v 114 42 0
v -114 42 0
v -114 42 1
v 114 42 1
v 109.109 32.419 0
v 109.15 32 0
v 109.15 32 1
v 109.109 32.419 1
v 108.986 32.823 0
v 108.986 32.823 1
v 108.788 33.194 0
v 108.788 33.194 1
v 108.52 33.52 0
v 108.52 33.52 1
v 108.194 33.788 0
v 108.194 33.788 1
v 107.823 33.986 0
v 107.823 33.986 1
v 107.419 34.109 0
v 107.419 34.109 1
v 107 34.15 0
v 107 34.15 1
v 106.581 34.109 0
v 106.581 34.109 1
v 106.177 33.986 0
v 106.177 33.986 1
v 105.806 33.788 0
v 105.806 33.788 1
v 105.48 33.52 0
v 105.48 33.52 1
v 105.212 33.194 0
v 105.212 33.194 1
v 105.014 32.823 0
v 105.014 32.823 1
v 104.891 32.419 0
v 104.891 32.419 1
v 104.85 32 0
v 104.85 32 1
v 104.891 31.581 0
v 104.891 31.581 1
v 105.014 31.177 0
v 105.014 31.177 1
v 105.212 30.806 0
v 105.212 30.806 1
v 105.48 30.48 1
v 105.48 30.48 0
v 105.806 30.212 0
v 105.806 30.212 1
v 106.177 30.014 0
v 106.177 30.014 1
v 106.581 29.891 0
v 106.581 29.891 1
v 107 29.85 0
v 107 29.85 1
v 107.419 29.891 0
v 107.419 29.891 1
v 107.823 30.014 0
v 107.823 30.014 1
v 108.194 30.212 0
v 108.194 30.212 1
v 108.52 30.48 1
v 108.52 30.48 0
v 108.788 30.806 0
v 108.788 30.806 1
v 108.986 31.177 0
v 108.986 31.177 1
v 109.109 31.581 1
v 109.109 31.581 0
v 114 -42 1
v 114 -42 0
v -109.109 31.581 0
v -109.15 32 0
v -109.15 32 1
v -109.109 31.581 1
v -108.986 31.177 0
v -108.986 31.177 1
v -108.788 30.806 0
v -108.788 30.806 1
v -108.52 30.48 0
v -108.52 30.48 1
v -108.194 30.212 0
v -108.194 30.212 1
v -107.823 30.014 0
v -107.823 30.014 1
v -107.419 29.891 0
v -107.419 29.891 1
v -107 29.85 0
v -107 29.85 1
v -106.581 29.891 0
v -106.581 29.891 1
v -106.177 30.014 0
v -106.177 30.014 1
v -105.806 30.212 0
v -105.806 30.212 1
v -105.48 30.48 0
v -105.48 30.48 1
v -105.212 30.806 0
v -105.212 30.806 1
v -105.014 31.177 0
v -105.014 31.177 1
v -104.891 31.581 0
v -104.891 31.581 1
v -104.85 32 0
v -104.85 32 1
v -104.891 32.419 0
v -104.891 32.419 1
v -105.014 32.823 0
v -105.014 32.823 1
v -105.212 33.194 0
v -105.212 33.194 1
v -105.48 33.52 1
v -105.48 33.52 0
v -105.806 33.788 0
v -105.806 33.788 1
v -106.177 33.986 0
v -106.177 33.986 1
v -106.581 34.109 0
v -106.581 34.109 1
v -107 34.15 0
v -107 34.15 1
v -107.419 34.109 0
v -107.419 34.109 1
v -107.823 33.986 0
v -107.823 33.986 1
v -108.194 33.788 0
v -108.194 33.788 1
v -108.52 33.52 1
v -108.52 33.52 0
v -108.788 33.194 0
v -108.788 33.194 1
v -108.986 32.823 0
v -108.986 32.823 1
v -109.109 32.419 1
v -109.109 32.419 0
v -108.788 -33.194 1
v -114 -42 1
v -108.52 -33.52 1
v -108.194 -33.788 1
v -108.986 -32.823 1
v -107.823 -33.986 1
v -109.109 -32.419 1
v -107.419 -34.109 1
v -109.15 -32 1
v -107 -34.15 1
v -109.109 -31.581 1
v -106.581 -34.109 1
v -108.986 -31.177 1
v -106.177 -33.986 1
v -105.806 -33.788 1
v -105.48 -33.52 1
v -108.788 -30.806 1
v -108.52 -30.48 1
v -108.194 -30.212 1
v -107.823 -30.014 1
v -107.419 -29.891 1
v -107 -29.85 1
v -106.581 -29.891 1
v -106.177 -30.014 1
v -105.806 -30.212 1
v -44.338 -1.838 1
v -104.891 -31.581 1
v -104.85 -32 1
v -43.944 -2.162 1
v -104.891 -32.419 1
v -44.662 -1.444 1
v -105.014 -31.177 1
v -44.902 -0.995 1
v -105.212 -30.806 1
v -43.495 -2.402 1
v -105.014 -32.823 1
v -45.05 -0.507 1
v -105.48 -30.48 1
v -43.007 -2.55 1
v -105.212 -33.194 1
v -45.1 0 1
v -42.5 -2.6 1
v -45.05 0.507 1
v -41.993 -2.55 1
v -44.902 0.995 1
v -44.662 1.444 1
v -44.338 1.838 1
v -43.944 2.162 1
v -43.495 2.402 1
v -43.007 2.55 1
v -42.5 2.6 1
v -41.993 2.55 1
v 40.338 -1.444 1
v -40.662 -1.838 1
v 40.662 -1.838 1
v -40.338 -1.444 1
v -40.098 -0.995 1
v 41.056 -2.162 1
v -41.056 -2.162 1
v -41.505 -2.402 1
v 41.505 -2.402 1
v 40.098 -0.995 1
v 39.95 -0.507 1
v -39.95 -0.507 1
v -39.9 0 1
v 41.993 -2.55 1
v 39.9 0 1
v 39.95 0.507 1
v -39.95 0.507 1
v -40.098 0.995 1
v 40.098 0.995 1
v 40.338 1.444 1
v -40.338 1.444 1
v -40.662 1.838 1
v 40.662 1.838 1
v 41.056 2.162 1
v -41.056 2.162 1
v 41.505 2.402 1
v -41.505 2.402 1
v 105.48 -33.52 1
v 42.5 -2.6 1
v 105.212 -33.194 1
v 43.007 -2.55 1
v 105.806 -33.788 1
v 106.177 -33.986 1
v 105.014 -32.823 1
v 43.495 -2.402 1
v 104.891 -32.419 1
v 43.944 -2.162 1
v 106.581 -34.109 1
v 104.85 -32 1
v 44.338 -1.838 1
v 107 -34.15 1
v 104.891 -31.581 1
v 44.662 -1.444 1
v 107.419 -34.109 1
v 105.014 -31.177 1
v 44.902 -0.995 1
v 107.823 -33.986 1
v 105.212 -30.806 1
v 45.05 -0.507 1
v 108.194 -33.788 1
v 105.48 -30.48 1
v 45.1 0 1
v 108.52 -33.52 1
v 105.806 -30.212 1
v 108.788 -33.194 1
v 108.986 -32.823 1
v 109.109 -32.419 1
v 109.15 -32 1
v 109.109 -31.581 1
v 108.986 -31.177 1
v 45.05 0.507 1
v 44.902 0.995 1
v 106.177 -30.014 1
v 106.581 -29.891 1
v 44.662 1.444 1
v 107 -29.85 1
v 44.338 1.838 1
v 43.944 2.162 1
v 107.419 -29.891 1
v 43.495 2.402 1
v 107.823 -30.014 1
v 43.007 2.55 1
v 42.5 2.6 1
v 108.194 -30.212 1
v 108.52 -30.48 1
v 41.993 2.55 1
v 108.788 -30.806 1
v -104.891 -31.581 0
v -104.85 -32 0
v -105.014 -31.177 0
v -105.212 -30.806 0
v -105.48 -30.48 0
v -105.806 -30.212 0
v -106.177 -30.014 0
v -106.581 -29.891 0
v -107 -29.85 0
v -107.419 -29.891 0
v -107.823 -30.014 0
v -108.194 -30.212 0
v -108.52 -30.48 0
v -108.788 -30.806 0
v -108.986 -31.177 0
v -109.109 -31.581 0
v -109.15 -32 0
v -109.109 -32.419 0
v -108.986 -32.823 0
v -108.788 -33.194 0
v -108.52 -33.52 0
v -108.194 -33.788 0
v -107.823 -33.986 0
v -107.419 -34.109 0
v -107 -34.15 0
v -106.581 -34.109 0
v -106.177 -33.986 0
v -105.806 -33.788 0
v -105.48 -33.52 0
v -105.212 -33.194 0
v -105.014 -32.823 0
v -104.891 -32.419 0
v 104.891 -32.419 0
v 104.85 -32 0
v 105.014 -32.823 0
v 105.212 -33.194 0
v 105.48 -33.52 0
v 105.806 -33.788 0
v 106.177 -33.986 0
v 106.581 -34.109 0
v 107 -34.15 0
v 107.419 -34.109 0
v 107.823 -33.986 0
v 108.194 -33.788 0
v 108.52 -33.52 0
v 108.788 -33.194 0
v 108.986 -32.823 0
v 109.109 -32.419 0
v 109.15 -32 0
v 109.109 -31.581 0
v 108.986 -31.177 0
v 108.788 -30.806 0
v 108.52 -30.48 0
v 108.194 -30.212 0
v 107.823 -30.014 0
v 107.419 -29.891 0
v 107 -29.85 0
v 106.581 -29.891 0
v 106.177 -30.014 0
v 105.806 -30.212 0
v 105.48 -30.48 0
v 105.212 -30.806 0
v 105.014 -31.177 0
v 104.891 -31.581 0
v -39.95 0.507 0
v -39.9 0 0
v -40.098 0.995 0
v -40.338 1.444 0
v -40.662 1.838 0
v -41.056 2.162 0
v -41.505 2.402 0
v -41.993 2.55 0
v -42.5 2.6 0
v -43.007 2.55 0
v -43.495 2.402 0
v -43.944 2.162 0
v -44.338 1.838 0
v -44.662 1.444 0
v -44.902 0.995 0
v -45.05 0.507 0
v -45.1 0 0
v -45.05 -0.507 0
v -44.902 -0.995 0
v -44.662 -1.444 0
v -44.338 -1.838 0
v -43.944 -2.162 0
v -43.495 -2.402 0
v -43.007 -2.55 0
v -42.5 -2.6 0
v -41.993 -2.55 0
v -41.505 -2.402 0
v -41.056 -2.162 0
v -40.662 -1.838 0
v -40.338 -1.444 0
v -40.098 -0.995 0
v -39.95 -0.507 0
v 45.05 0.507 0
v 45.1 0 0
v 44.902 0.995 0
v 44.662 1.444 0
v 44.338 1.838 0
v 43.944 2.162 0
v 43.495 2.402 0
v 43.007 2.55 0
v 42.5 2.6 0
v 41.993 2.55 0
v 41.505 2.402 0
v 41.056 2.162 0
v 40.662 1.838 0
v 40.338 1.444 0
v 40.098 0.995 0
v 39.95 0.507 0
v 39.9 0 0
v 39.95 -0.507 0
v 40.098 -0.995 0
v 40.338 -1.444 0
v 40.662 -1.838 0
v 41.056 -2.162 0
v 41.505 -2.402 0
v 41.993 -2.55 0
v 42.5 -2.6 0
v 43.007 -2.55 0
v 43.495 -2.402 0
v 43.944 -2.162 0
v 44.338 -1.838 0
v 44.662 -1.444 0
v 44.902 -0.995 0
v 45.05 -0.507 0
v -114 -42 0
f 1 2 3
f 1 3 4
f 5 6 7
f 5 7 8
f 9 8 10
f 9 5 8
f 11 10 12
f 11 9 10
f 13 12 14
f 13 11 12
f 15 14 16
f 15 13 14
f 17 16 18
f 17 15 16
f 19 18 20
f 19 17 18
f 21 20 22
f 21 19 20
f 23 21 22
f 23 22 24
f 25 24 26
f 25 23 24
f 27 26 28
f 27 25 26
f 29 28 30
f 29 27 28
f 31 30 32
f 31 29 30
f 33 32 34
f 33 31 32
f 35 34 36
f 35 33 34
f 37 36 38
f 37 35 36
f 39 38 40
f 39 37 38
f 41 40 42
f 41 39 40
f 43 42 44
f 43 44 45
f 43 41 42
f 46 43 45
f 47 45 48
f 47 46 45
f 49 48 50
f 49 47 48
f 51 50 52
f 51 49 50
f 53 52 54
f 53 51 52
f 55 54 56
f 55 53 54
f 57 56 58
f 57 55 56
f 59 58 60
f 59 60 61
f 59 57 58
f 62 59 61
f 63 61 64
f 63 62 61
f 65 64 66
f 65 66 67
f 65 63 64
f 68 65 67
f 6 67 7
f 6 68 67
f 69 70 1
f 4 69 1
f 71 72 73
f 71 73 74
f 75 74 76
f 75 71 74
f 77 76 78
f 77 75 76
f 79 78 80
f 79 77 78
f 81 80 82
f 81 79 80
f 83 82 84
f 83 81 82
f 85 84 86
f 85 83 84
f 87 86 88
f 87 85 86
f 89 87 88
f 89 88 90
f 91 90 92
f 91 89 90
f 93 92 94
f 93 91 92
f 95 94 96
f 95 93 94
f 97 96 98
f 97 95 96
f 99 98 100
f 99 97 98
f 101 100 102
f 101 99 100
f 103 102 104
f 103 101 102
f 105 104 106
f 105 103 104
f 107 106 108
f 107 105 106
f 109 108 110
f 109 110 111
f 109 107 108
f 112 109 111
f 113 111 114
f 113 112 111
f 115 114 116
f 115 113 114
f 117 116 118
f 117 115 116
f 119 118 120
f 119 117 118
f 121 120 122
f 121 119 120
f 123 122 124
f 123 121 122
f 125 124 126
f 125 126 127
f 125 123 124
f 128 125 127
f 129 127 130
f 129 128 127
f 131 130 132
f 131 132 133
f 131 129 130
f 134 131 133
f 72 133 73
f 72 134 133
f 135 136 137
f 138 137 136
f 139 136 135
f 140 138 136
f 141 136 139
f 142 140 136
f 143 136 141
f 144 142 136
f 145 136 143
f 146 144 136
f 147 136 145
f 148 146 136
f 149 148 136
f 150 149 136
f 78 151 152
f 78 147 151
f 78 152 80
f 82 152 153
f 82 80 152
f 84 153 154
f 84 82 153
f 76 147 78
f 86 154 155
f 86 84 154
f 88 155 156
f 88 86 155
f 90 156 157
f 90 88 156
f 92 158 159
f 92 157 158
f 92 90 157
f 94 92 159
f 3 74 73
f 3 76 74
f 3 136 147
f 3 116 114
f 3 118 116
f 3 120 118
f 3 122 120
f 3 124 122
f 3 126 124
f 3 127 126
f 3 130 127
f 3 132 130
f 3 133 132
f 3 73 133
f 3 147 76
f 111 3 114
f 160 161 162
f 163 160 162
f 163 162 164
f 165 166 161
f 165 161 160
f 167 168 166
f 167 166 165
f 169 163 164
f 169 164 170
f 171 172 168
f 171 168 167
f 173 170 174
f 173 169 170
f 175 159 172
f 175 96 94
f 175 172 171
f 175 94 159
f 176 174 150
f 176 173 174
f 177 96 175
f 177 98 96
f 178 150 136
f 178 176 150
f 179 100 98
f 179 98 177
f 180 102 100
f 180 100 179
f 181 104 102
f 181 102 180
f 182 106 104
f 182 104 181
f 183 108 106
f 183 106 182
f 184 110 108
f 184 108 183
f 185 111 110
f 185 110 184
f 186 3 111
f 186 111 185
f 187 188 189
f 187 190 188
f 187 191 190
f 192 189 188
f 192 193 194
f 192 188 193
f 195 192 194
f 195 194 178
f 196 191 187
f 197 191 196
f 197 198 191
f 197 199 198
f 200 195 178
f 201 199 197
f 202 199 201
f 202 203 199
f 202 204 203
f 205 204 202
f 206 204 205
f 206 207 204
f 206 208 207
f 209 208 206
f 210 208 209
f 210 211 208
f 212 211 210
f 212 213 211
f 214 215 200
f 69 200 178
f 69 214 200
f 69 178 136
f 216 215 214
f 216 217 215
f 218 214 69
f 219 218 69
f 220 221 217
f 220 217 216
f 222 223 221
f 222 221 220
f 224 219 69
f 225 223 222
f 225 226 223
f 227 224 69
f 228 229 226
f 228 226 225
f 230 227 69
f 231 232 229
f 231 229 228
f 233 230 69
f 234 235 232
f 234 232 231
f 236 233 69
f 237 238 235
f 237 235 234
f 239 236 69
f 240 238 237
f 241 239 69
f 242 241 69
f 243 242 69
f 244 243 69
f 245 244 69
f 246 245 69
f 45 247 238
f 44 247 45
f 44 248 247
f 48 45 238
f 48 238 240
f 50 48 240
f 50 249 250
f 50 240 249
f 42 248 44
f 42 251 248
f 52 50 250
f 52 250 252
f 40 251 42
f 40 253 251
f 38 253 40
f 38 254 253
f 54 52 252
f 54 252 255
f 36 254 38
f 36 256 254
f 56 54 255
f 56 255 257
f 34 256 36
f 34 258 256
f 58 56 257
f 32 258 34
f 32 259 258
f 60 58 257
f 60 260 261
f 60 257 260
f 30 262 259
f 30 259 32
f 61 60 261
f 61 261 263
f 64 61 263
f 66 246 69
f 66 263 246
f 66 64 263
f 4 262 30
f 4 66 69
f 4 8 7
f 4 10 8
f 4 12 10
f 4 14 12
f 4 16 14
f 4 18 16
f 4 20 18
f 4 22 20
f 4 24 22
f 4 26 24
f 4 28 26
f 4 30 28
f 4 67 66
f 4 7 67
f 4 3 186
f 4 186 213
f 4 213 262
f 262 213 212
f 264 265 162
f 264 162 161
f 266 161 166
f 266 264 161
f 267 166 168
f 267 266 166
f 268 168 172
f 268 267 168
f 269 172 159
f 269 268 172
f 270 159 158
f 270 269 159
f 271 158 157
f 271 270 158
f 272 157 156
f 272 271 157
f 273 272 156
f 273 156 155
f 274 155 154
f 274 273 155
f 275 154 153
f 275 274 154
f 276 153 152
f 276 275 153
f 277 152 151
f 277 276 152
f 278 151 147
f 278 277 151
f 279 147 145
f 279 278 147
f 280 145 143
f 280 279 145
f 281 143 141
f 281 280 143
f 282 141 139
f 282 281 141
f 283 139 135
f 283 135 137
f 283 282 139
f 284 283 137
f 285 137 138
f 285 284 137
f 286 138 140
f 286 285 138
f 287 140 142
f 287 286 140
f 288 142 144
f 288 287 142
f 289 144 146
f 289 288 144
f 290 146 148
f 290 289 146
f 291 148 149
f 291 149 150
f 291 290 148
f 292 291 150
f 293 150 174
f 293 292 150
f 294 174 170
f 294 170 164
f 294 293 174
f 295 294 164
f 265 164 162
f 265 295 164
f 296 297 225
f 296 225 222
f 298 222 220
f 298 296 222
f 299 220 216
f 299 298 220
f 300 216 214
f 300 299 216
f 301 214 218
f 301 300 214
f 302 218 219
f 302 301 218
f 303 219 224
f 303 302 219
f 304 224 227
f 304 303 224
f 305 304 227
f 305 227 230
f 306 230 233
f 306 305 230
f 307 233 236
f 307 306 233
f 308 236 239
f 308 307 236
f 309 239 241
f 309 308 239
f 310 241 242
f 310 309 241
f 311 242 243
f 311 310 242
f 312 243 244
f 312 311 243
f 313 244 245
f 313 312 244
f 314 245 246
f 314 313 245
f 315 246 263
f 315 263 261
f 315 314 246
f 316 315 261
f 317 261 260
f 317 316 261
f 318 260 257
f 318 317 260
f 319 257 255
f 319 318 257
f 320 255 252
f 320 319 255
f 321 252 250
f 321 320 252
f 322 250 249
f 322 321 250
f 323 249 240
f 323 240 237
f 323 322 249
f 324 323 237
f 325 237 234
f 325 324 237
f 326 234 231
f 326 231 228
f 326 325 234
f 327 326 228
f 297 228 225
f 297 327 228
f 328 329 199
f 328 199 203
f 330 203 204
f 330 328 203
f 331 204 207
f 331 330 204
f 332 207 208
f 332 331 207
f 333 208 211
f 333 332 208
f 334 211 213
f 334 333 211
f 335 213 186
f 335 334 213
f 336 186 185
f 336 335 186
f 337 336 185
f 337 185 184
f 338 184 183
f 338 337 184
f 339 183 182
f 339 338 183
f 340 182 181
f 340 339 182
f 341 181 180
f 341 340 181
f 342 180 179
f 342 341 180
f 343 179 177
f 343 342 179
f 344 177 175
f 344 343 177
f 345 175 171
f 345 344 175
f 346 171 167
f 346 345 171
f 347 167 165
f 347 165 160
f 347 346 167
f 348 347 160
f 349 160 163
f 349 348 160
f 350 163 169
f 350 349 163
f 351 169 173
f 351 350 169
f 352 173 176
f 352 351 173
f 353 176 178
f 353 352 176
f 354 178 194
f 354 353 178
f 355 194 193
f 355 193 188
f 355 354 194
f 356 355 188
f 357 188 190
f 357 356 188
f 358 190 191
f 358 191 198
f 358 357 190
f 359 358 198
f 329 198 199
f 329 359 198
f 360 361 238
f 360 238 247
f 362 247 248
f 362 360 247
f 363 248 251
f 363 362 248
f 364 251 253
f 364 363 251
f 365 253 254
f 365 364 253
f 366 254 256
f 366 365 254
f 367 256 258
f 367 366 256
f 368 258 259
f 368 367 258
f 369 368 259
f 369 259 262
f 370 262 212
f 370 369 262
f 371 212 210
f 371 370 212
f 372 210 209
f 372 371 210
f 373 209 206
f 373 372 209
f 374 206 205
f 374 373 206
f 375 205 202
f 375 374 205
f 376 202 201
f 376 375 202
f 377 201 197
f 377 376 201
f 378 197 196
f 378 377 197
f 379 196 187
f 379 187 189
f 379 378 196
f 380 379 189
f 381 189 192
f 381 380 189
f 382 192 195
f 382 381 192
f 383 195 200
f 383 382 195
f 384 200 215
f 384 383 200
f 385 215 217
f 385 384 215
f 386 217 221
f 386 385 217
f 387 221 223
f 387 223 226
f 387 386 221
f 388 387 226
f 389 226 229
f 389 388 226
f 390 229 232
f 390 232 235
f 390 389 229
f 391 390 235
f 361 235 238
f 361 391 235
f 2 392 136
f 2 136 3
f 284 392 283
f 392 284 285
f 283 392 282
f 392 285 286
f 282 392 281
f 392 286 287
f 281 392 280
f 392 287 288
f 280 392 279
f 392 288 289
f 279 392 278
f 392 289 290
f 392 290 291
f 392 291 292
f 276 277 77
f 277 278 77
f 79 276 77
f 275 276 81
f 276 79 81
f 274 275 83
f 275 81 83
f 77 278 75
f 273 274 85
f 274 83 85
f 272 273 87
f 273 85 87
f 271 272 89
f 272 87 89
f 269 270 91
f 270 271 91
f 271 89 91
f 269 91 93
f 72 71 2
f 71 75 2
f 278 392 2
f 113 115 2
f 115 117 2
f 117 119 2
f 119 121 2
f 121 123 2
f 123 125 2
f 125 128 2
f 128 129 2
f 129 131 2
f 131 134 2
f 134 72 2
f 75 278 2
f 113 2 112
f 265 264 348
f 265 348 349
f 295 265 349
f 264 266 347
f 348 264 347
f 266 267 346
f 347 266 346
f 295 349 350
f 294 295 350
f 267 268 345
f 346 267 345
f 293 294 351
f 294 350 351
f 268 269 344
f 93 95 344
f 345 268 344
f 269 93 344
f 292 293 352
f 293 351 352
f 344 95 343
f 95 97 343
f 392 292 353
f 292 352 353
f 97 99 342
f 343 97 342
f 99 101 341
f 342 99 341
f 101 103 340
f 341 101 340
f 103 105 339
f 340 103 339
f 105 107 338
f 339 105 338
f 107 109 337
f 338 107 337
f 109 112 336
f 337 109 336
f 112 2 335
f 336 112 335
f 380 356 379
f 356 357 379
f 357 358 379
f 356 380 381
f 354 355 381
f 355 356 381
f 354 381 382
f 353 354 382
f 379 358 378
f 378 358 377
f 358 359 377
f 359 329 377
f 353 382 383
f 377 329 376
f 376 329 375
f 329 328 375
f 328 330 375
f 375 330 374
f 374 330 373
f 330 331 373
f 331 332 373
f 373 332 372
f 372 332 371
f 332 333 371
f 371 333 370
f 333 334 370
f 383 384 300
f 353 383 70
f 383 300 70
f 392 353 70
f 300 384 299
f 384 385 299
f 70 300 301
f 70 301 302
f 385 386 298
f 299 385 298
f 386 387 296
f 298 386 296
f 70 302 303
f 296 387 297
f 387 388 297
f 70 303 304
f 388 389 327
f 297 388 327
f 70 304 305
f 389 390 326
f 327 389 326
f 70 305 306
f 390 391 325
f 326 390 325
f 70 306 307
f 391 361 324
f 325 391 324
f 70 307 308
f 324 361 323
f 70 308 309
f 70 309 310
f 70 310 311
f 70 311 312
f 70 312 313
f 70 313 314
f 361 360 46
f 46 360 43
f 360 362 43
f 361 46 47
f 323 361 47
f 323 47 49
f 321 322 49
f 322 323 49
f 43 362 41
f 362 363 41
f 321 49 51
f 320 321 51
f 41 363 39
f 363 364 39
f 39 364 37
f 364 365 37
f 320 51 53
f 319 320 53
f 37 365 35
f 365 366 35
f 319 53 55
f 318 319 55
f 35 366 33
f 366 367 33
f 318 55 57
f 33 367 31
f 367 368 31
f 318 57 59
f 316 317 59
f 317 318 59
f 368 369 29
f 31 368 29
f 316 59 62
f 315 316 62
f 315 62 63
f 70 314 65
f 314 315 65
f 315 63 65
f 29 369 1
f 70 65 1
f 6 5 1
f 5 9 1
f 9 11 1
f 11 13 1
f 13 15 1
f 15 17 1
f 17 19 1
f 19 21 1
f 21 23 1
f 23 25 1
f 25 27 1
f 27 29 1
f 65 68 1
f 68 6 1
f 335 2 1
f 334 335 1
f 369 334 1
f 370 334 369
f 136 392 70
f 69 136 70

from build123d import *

# Parameters (mm, degrees)
SKETCH_1_W      = 228
SKETCH_1_H      = 84
SKETCH_1_R      = 2.6
SKETCH_1_R_2    = 2.15
EXTRUDE_1_DEPTH = 1


with BuildPart() as part:
    # Эскиз1 → Вытянуть1 (new body)
    with BuildSketch(Plane.XY):
        Rectangle(SKETCH_1_W, SKETCH_1_H)
        with Locations((-42.5, 0)):
            Circle(SKETCH_1_R, mode=Mode.SUBTRACT)
        with Locations((42.5, 0)):
            Circle(SKETCH_1_R, mode=Mode.SUBTRACT)
        with Locations((107, 32)):
            Circle(SKETCH_1_R_2, mode=Mode.SUBTRACT)
        with Locations(Location((-107, 32, 0), (0, 0, 180))):
            Circle(SKETCH_1_R_2, mode=Mode.SUBTRACT)
        with Locations((-107, -32)):
            Circle(SKETCH_1_R_2, mode=Mode.SUBTRACT)
        with Locations(Location((107, -32, 0), (0, 0, 180))):
            Circle(SKETCH_1_R_2, mode=Mode.SUBTRACT)
    extrude(amount=EXTRUDE_1_DEPTH)


solid = part.part
